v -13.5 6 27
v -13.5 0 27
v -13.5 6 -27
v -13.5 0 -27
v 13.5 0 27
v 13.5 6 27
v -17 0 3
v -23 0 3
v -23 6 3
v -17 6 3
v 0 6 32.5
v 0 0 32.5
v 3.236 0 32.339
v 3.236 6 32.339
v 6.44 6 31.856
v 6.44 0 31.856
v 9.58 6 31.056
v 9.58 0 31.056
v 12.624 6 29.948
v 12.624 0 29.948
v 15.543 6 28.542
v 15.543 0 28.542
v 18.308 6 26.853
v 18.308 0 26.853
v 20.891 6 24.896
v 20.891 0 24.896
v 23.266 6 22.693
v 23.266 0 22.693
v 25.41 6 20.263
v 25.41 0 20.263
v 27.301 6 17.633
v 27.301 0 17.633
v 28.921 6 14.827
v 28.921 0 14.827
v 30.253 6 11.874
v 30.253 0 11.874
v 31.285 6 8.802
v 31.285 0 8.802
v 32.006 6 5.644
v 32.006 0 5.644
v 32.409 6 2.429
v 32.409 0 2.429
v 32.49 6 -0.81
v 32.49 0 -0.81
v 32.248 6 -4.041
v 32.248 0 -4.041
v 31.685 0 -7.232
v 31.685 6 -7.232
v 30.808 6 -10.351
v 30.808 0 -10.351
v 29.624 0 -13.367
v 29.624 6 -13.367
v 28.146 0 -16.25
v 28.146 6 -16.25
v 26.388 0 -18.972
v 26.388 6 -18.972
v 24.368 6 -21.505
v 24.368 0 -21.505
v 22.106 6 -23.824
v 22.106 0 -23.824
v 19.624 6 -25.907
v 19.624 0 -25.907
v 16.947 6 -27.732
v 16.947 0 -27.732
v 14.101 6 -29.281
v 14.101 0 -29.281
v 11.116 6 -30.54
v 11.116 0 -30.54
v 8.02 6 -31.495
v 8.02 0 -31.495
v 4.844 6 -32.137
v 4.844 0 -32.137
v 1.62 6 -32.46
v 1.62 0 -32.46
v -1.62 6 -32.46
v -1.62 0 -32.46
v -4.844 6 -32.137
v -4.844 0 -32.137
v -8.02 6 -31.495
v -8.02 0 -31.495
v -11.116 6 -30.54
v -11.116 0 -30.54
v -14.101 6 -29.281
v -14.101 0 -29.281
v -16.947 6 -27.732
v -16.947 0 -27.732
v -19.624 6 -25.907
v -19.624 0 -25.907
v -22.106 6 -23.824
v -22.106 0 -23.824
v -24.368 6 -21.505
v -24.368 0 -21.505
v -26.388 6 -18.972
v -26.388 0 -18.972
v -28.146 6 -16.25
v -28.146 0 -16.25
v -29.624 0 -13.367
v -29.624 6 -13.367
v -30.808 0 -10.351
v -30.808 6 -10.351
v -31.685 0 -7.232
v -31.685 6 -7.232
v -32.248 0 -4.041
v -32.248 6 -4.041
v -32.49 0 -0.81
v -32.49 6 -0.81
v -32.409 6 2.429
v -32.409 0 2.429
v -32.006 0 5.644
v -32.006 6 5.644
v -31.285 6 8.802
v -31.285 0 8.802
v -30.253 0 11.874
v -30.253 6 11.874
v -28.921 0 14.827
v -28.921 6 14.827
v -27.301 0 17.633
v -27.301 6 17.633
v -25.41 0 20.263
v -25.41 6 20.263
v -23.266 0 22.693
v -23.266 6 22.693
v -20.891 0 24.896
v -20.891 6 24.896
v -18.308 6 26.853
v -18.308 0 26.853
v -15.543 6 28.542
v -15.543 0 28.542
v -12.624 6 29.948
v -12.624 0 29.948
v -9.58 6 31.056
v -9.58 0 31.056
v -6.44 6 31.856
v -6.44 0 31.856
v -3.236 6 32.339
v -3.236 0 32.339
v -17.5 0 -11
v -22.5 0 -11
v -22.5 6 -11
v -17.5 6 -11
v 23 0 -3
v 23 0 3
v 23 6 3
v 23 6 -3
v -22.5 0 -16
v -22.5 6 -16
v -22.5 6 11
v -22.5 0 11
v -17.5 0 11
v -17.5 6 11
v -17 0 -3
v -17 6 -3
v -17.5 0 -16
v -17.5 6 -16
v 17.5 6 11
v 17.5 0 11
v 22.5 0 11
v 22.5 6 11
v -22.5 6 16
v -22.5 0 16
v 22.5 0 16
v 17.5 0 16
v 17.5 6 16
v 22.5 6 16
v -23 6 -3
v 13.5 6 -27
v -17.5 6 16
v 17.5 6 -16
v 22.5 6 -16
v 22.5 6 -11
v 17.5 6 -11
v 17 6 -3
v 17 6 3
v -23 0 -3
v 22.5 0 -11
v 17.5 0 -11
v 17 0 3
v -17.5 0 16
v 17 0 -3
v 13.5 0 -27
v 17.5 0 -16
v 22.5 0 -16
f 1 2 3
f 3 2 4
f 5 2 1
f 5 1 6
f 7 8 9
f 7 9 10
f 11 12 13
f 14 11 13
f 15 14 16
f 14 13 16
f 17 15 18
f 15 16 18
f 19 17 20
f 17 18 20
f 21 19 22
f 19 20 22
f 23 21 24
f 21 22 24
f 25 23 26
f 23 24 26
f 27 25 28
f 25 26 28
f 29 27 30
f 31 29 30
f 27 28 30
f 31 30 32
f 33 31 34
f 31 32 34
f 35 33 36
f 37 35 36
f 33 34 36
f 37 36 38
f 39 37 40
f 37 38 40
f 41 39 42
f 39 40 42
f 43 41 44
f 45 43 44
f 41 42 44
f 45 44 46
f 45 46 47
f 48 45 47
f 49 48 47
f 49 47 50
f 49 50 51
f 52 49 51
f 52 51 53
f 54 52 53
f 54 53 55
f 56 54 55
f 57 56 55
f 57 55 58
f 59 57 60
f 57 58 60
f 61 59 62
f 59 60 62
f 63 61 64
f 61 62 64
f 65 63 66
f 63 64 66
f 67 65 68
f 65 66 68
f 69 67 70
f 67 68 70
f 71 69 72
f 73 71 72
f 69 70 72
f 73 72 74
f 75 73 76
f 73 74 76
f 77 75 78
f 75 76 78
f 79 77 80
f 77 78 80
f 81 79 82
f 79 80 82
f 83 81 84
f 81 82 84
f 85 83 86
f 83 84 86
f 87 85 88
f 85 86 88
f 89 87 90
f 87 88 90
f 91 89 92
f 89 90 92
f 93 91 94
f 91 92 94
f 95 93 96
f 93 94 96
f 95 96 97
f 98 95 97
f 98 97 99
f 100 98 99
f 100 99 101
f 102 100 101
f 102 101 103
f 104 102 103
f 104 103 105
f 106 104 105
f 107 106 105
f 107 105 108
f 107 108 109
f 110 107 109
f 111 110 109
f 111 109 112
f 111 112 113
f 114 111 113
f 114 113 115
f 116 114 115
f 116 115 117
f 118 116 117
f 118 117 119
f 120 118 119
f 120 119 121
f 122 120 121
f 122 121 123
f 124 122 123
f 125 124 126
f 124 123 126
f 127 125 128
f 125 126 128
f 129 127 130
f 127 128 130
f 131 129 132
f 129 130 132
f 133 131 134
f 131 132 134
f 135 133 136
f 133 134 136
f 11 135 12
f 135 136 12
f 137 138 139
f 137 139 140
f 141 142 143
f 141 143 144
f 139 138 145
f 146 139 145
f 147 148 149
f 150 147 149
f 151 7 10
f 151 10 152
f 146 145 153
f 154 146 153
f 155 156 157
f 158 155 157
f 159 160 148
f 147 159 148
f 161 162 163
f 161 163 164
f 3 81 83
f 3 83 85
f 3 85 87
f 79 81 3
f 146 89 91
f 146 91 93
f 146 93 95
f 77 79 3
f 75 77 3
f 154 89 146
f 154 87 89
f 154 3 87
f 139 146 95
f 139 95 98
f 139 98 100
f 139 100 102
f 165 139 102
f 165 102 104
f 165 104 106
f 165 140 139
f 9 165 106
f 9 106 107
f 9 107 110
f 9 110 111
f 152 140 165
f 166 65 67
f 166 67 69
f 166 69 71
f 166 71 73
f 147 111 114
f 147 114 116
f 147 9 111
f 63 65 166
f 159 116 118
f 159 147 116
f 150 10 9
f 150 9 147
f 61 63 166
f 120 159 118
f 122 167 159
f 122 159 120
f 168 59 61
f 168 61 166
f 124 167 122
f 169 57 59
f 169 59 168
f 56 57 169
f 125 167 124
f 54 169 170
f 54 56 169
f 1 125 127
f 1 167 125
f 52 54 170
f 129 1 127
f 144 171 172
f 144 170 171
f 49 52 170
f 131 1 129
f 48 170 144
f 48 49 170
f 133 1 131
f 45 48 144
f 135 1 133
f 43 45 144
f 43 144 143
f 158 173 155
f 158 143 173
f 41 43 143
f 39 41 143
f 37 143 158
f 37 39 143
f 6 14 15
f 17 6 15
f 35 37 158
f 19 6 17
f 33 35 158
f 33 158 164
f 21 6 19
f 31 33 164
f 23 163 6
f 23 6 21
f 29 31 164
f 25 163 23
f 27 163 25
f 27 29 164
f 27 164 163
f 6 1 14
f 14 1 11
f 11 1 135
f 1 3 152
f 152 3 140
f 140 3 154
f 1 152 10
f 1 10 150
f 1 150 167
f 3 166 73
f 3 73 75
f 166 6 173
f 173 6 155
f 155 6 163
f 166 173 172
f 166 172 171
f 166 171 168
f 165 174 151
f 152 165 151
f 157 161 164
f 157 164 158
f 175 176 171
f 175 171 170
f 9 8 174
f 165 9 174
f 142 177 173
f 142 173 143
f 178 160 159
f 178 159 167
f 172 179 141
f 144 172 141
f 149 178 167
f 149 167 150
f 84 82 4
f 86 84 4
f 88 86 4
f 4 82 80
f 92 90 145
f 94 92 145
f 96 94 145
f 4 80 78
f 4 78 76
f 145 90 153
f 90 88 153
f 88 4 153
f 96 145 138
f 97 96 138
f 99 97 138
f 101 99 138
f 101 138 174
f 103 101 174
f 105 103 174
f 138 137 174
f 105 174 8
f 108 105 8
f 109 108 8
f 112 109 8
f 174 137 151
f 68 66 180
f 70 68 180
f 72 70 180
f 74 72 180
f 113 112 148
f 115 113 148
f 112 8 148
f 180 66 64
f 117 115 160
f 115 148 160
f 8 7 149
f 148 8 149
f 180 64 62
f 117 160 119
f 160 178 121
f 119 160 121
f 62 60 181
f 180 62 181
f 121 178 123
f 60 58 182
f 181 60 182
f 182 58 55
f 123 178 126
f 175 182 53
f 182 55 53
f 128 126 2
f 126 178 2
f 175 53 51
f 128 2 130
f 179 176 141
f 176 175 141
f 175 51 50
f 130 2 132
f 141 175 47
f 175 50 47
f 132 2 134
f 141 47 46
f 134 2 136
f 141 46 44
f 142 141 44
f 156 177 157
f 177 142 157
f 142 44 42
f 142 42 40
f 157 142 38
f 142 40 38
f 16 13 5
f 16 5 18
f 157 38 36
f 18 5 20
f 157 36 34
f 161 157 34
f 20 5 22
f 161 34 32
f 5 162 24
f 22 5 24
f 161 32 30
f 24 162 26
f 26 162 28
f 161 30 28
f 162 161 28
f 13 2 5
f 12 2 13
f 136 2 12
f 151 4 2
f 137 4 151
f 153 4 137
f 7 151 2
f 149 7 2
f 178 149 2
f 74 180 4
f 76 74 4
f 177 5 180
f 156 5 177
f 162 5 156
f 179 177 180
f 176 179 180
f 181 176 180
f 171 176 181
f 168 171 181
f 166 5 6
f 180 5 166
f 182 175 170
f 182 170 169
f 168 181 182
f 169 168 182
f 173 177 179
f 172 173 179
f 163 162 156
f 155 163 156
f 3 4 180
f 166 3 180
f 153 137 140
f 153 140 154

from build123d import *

# Parameters (mm, degrees)
SKETCH1_R               = 32.5
SKETCH1_W               = 6
SKETCH1_H               = 6
SKETCH1_W_2             = 27
SKETCH1_H_2             = 54
BOSS_EXTRUDE1_DEPTH     = 6
CUT_EXTRUDE2_DEPTH      = 47.351914739
CUT_EXTRUDE2_DEPTH_BACK = 47.351914739
SKETCH2_W               = 5
SKETCH2_H               = 5


with BuildPart() as part:
    # Sketch1 → Boss-Extrude1 (new body)
    with BuildSketch(Plane(origin=(0, 0, 0), x_dir=(1, 0, 0), z_dir=(0, 1, 0))):
        with Locations(Location((0, 0, 0), (0, 0, 270))):
            Circle(SKETCH1_R)
        with Locations((-20, 0)):
            Rectangle(SKETCH1_W, SKETCH1_H, mode=Mode.SUBTRACT)
        Rectangle(SKETCH1_W_2, SKETCH1_H_2, mode=Mode.SUBTRACT)
        with Locations((20, 0)):
            Rectangle(SKETCH1_W, SKETCH1_H, mode=Mode.SUBTRACT)
    extrude(amount=BOSS_EXTRUDE1_DEPTH)

    # Sketch2 → Cut-Extrude2 (cut, two sides: drawn at the far end of the back side and taken through both)
    with BuildSketch(Plane(origin=(0, 0, 0), x_dir=(1, 0, 0), z_dir=(0, 1, 0)).offset(-CUT_EXTRUDE2_DEPTH_BACK)):
        with Locations((-20, 13.5)):
            Rectangle(SKETCH2_W, SKETCH2_H)
        with Locations((-20, -13.5)):
            Rectangle(SKETCH2_W, SKETCH2_H)
        with Locations((20, -13.5)):
            Rectangle(SKETCH2_W, SKETCH2_H)
        with Locations((20, 13.5)):
            Rectangle(SKETCH2_W, SKETCH2_H)
    extrude(amount=CUT_EXTRUDE2_DEPTH + CUT_EXTRUDE2_DEPTH_BACK, mode=Mode.SUBTRACT)


solid = part.part
